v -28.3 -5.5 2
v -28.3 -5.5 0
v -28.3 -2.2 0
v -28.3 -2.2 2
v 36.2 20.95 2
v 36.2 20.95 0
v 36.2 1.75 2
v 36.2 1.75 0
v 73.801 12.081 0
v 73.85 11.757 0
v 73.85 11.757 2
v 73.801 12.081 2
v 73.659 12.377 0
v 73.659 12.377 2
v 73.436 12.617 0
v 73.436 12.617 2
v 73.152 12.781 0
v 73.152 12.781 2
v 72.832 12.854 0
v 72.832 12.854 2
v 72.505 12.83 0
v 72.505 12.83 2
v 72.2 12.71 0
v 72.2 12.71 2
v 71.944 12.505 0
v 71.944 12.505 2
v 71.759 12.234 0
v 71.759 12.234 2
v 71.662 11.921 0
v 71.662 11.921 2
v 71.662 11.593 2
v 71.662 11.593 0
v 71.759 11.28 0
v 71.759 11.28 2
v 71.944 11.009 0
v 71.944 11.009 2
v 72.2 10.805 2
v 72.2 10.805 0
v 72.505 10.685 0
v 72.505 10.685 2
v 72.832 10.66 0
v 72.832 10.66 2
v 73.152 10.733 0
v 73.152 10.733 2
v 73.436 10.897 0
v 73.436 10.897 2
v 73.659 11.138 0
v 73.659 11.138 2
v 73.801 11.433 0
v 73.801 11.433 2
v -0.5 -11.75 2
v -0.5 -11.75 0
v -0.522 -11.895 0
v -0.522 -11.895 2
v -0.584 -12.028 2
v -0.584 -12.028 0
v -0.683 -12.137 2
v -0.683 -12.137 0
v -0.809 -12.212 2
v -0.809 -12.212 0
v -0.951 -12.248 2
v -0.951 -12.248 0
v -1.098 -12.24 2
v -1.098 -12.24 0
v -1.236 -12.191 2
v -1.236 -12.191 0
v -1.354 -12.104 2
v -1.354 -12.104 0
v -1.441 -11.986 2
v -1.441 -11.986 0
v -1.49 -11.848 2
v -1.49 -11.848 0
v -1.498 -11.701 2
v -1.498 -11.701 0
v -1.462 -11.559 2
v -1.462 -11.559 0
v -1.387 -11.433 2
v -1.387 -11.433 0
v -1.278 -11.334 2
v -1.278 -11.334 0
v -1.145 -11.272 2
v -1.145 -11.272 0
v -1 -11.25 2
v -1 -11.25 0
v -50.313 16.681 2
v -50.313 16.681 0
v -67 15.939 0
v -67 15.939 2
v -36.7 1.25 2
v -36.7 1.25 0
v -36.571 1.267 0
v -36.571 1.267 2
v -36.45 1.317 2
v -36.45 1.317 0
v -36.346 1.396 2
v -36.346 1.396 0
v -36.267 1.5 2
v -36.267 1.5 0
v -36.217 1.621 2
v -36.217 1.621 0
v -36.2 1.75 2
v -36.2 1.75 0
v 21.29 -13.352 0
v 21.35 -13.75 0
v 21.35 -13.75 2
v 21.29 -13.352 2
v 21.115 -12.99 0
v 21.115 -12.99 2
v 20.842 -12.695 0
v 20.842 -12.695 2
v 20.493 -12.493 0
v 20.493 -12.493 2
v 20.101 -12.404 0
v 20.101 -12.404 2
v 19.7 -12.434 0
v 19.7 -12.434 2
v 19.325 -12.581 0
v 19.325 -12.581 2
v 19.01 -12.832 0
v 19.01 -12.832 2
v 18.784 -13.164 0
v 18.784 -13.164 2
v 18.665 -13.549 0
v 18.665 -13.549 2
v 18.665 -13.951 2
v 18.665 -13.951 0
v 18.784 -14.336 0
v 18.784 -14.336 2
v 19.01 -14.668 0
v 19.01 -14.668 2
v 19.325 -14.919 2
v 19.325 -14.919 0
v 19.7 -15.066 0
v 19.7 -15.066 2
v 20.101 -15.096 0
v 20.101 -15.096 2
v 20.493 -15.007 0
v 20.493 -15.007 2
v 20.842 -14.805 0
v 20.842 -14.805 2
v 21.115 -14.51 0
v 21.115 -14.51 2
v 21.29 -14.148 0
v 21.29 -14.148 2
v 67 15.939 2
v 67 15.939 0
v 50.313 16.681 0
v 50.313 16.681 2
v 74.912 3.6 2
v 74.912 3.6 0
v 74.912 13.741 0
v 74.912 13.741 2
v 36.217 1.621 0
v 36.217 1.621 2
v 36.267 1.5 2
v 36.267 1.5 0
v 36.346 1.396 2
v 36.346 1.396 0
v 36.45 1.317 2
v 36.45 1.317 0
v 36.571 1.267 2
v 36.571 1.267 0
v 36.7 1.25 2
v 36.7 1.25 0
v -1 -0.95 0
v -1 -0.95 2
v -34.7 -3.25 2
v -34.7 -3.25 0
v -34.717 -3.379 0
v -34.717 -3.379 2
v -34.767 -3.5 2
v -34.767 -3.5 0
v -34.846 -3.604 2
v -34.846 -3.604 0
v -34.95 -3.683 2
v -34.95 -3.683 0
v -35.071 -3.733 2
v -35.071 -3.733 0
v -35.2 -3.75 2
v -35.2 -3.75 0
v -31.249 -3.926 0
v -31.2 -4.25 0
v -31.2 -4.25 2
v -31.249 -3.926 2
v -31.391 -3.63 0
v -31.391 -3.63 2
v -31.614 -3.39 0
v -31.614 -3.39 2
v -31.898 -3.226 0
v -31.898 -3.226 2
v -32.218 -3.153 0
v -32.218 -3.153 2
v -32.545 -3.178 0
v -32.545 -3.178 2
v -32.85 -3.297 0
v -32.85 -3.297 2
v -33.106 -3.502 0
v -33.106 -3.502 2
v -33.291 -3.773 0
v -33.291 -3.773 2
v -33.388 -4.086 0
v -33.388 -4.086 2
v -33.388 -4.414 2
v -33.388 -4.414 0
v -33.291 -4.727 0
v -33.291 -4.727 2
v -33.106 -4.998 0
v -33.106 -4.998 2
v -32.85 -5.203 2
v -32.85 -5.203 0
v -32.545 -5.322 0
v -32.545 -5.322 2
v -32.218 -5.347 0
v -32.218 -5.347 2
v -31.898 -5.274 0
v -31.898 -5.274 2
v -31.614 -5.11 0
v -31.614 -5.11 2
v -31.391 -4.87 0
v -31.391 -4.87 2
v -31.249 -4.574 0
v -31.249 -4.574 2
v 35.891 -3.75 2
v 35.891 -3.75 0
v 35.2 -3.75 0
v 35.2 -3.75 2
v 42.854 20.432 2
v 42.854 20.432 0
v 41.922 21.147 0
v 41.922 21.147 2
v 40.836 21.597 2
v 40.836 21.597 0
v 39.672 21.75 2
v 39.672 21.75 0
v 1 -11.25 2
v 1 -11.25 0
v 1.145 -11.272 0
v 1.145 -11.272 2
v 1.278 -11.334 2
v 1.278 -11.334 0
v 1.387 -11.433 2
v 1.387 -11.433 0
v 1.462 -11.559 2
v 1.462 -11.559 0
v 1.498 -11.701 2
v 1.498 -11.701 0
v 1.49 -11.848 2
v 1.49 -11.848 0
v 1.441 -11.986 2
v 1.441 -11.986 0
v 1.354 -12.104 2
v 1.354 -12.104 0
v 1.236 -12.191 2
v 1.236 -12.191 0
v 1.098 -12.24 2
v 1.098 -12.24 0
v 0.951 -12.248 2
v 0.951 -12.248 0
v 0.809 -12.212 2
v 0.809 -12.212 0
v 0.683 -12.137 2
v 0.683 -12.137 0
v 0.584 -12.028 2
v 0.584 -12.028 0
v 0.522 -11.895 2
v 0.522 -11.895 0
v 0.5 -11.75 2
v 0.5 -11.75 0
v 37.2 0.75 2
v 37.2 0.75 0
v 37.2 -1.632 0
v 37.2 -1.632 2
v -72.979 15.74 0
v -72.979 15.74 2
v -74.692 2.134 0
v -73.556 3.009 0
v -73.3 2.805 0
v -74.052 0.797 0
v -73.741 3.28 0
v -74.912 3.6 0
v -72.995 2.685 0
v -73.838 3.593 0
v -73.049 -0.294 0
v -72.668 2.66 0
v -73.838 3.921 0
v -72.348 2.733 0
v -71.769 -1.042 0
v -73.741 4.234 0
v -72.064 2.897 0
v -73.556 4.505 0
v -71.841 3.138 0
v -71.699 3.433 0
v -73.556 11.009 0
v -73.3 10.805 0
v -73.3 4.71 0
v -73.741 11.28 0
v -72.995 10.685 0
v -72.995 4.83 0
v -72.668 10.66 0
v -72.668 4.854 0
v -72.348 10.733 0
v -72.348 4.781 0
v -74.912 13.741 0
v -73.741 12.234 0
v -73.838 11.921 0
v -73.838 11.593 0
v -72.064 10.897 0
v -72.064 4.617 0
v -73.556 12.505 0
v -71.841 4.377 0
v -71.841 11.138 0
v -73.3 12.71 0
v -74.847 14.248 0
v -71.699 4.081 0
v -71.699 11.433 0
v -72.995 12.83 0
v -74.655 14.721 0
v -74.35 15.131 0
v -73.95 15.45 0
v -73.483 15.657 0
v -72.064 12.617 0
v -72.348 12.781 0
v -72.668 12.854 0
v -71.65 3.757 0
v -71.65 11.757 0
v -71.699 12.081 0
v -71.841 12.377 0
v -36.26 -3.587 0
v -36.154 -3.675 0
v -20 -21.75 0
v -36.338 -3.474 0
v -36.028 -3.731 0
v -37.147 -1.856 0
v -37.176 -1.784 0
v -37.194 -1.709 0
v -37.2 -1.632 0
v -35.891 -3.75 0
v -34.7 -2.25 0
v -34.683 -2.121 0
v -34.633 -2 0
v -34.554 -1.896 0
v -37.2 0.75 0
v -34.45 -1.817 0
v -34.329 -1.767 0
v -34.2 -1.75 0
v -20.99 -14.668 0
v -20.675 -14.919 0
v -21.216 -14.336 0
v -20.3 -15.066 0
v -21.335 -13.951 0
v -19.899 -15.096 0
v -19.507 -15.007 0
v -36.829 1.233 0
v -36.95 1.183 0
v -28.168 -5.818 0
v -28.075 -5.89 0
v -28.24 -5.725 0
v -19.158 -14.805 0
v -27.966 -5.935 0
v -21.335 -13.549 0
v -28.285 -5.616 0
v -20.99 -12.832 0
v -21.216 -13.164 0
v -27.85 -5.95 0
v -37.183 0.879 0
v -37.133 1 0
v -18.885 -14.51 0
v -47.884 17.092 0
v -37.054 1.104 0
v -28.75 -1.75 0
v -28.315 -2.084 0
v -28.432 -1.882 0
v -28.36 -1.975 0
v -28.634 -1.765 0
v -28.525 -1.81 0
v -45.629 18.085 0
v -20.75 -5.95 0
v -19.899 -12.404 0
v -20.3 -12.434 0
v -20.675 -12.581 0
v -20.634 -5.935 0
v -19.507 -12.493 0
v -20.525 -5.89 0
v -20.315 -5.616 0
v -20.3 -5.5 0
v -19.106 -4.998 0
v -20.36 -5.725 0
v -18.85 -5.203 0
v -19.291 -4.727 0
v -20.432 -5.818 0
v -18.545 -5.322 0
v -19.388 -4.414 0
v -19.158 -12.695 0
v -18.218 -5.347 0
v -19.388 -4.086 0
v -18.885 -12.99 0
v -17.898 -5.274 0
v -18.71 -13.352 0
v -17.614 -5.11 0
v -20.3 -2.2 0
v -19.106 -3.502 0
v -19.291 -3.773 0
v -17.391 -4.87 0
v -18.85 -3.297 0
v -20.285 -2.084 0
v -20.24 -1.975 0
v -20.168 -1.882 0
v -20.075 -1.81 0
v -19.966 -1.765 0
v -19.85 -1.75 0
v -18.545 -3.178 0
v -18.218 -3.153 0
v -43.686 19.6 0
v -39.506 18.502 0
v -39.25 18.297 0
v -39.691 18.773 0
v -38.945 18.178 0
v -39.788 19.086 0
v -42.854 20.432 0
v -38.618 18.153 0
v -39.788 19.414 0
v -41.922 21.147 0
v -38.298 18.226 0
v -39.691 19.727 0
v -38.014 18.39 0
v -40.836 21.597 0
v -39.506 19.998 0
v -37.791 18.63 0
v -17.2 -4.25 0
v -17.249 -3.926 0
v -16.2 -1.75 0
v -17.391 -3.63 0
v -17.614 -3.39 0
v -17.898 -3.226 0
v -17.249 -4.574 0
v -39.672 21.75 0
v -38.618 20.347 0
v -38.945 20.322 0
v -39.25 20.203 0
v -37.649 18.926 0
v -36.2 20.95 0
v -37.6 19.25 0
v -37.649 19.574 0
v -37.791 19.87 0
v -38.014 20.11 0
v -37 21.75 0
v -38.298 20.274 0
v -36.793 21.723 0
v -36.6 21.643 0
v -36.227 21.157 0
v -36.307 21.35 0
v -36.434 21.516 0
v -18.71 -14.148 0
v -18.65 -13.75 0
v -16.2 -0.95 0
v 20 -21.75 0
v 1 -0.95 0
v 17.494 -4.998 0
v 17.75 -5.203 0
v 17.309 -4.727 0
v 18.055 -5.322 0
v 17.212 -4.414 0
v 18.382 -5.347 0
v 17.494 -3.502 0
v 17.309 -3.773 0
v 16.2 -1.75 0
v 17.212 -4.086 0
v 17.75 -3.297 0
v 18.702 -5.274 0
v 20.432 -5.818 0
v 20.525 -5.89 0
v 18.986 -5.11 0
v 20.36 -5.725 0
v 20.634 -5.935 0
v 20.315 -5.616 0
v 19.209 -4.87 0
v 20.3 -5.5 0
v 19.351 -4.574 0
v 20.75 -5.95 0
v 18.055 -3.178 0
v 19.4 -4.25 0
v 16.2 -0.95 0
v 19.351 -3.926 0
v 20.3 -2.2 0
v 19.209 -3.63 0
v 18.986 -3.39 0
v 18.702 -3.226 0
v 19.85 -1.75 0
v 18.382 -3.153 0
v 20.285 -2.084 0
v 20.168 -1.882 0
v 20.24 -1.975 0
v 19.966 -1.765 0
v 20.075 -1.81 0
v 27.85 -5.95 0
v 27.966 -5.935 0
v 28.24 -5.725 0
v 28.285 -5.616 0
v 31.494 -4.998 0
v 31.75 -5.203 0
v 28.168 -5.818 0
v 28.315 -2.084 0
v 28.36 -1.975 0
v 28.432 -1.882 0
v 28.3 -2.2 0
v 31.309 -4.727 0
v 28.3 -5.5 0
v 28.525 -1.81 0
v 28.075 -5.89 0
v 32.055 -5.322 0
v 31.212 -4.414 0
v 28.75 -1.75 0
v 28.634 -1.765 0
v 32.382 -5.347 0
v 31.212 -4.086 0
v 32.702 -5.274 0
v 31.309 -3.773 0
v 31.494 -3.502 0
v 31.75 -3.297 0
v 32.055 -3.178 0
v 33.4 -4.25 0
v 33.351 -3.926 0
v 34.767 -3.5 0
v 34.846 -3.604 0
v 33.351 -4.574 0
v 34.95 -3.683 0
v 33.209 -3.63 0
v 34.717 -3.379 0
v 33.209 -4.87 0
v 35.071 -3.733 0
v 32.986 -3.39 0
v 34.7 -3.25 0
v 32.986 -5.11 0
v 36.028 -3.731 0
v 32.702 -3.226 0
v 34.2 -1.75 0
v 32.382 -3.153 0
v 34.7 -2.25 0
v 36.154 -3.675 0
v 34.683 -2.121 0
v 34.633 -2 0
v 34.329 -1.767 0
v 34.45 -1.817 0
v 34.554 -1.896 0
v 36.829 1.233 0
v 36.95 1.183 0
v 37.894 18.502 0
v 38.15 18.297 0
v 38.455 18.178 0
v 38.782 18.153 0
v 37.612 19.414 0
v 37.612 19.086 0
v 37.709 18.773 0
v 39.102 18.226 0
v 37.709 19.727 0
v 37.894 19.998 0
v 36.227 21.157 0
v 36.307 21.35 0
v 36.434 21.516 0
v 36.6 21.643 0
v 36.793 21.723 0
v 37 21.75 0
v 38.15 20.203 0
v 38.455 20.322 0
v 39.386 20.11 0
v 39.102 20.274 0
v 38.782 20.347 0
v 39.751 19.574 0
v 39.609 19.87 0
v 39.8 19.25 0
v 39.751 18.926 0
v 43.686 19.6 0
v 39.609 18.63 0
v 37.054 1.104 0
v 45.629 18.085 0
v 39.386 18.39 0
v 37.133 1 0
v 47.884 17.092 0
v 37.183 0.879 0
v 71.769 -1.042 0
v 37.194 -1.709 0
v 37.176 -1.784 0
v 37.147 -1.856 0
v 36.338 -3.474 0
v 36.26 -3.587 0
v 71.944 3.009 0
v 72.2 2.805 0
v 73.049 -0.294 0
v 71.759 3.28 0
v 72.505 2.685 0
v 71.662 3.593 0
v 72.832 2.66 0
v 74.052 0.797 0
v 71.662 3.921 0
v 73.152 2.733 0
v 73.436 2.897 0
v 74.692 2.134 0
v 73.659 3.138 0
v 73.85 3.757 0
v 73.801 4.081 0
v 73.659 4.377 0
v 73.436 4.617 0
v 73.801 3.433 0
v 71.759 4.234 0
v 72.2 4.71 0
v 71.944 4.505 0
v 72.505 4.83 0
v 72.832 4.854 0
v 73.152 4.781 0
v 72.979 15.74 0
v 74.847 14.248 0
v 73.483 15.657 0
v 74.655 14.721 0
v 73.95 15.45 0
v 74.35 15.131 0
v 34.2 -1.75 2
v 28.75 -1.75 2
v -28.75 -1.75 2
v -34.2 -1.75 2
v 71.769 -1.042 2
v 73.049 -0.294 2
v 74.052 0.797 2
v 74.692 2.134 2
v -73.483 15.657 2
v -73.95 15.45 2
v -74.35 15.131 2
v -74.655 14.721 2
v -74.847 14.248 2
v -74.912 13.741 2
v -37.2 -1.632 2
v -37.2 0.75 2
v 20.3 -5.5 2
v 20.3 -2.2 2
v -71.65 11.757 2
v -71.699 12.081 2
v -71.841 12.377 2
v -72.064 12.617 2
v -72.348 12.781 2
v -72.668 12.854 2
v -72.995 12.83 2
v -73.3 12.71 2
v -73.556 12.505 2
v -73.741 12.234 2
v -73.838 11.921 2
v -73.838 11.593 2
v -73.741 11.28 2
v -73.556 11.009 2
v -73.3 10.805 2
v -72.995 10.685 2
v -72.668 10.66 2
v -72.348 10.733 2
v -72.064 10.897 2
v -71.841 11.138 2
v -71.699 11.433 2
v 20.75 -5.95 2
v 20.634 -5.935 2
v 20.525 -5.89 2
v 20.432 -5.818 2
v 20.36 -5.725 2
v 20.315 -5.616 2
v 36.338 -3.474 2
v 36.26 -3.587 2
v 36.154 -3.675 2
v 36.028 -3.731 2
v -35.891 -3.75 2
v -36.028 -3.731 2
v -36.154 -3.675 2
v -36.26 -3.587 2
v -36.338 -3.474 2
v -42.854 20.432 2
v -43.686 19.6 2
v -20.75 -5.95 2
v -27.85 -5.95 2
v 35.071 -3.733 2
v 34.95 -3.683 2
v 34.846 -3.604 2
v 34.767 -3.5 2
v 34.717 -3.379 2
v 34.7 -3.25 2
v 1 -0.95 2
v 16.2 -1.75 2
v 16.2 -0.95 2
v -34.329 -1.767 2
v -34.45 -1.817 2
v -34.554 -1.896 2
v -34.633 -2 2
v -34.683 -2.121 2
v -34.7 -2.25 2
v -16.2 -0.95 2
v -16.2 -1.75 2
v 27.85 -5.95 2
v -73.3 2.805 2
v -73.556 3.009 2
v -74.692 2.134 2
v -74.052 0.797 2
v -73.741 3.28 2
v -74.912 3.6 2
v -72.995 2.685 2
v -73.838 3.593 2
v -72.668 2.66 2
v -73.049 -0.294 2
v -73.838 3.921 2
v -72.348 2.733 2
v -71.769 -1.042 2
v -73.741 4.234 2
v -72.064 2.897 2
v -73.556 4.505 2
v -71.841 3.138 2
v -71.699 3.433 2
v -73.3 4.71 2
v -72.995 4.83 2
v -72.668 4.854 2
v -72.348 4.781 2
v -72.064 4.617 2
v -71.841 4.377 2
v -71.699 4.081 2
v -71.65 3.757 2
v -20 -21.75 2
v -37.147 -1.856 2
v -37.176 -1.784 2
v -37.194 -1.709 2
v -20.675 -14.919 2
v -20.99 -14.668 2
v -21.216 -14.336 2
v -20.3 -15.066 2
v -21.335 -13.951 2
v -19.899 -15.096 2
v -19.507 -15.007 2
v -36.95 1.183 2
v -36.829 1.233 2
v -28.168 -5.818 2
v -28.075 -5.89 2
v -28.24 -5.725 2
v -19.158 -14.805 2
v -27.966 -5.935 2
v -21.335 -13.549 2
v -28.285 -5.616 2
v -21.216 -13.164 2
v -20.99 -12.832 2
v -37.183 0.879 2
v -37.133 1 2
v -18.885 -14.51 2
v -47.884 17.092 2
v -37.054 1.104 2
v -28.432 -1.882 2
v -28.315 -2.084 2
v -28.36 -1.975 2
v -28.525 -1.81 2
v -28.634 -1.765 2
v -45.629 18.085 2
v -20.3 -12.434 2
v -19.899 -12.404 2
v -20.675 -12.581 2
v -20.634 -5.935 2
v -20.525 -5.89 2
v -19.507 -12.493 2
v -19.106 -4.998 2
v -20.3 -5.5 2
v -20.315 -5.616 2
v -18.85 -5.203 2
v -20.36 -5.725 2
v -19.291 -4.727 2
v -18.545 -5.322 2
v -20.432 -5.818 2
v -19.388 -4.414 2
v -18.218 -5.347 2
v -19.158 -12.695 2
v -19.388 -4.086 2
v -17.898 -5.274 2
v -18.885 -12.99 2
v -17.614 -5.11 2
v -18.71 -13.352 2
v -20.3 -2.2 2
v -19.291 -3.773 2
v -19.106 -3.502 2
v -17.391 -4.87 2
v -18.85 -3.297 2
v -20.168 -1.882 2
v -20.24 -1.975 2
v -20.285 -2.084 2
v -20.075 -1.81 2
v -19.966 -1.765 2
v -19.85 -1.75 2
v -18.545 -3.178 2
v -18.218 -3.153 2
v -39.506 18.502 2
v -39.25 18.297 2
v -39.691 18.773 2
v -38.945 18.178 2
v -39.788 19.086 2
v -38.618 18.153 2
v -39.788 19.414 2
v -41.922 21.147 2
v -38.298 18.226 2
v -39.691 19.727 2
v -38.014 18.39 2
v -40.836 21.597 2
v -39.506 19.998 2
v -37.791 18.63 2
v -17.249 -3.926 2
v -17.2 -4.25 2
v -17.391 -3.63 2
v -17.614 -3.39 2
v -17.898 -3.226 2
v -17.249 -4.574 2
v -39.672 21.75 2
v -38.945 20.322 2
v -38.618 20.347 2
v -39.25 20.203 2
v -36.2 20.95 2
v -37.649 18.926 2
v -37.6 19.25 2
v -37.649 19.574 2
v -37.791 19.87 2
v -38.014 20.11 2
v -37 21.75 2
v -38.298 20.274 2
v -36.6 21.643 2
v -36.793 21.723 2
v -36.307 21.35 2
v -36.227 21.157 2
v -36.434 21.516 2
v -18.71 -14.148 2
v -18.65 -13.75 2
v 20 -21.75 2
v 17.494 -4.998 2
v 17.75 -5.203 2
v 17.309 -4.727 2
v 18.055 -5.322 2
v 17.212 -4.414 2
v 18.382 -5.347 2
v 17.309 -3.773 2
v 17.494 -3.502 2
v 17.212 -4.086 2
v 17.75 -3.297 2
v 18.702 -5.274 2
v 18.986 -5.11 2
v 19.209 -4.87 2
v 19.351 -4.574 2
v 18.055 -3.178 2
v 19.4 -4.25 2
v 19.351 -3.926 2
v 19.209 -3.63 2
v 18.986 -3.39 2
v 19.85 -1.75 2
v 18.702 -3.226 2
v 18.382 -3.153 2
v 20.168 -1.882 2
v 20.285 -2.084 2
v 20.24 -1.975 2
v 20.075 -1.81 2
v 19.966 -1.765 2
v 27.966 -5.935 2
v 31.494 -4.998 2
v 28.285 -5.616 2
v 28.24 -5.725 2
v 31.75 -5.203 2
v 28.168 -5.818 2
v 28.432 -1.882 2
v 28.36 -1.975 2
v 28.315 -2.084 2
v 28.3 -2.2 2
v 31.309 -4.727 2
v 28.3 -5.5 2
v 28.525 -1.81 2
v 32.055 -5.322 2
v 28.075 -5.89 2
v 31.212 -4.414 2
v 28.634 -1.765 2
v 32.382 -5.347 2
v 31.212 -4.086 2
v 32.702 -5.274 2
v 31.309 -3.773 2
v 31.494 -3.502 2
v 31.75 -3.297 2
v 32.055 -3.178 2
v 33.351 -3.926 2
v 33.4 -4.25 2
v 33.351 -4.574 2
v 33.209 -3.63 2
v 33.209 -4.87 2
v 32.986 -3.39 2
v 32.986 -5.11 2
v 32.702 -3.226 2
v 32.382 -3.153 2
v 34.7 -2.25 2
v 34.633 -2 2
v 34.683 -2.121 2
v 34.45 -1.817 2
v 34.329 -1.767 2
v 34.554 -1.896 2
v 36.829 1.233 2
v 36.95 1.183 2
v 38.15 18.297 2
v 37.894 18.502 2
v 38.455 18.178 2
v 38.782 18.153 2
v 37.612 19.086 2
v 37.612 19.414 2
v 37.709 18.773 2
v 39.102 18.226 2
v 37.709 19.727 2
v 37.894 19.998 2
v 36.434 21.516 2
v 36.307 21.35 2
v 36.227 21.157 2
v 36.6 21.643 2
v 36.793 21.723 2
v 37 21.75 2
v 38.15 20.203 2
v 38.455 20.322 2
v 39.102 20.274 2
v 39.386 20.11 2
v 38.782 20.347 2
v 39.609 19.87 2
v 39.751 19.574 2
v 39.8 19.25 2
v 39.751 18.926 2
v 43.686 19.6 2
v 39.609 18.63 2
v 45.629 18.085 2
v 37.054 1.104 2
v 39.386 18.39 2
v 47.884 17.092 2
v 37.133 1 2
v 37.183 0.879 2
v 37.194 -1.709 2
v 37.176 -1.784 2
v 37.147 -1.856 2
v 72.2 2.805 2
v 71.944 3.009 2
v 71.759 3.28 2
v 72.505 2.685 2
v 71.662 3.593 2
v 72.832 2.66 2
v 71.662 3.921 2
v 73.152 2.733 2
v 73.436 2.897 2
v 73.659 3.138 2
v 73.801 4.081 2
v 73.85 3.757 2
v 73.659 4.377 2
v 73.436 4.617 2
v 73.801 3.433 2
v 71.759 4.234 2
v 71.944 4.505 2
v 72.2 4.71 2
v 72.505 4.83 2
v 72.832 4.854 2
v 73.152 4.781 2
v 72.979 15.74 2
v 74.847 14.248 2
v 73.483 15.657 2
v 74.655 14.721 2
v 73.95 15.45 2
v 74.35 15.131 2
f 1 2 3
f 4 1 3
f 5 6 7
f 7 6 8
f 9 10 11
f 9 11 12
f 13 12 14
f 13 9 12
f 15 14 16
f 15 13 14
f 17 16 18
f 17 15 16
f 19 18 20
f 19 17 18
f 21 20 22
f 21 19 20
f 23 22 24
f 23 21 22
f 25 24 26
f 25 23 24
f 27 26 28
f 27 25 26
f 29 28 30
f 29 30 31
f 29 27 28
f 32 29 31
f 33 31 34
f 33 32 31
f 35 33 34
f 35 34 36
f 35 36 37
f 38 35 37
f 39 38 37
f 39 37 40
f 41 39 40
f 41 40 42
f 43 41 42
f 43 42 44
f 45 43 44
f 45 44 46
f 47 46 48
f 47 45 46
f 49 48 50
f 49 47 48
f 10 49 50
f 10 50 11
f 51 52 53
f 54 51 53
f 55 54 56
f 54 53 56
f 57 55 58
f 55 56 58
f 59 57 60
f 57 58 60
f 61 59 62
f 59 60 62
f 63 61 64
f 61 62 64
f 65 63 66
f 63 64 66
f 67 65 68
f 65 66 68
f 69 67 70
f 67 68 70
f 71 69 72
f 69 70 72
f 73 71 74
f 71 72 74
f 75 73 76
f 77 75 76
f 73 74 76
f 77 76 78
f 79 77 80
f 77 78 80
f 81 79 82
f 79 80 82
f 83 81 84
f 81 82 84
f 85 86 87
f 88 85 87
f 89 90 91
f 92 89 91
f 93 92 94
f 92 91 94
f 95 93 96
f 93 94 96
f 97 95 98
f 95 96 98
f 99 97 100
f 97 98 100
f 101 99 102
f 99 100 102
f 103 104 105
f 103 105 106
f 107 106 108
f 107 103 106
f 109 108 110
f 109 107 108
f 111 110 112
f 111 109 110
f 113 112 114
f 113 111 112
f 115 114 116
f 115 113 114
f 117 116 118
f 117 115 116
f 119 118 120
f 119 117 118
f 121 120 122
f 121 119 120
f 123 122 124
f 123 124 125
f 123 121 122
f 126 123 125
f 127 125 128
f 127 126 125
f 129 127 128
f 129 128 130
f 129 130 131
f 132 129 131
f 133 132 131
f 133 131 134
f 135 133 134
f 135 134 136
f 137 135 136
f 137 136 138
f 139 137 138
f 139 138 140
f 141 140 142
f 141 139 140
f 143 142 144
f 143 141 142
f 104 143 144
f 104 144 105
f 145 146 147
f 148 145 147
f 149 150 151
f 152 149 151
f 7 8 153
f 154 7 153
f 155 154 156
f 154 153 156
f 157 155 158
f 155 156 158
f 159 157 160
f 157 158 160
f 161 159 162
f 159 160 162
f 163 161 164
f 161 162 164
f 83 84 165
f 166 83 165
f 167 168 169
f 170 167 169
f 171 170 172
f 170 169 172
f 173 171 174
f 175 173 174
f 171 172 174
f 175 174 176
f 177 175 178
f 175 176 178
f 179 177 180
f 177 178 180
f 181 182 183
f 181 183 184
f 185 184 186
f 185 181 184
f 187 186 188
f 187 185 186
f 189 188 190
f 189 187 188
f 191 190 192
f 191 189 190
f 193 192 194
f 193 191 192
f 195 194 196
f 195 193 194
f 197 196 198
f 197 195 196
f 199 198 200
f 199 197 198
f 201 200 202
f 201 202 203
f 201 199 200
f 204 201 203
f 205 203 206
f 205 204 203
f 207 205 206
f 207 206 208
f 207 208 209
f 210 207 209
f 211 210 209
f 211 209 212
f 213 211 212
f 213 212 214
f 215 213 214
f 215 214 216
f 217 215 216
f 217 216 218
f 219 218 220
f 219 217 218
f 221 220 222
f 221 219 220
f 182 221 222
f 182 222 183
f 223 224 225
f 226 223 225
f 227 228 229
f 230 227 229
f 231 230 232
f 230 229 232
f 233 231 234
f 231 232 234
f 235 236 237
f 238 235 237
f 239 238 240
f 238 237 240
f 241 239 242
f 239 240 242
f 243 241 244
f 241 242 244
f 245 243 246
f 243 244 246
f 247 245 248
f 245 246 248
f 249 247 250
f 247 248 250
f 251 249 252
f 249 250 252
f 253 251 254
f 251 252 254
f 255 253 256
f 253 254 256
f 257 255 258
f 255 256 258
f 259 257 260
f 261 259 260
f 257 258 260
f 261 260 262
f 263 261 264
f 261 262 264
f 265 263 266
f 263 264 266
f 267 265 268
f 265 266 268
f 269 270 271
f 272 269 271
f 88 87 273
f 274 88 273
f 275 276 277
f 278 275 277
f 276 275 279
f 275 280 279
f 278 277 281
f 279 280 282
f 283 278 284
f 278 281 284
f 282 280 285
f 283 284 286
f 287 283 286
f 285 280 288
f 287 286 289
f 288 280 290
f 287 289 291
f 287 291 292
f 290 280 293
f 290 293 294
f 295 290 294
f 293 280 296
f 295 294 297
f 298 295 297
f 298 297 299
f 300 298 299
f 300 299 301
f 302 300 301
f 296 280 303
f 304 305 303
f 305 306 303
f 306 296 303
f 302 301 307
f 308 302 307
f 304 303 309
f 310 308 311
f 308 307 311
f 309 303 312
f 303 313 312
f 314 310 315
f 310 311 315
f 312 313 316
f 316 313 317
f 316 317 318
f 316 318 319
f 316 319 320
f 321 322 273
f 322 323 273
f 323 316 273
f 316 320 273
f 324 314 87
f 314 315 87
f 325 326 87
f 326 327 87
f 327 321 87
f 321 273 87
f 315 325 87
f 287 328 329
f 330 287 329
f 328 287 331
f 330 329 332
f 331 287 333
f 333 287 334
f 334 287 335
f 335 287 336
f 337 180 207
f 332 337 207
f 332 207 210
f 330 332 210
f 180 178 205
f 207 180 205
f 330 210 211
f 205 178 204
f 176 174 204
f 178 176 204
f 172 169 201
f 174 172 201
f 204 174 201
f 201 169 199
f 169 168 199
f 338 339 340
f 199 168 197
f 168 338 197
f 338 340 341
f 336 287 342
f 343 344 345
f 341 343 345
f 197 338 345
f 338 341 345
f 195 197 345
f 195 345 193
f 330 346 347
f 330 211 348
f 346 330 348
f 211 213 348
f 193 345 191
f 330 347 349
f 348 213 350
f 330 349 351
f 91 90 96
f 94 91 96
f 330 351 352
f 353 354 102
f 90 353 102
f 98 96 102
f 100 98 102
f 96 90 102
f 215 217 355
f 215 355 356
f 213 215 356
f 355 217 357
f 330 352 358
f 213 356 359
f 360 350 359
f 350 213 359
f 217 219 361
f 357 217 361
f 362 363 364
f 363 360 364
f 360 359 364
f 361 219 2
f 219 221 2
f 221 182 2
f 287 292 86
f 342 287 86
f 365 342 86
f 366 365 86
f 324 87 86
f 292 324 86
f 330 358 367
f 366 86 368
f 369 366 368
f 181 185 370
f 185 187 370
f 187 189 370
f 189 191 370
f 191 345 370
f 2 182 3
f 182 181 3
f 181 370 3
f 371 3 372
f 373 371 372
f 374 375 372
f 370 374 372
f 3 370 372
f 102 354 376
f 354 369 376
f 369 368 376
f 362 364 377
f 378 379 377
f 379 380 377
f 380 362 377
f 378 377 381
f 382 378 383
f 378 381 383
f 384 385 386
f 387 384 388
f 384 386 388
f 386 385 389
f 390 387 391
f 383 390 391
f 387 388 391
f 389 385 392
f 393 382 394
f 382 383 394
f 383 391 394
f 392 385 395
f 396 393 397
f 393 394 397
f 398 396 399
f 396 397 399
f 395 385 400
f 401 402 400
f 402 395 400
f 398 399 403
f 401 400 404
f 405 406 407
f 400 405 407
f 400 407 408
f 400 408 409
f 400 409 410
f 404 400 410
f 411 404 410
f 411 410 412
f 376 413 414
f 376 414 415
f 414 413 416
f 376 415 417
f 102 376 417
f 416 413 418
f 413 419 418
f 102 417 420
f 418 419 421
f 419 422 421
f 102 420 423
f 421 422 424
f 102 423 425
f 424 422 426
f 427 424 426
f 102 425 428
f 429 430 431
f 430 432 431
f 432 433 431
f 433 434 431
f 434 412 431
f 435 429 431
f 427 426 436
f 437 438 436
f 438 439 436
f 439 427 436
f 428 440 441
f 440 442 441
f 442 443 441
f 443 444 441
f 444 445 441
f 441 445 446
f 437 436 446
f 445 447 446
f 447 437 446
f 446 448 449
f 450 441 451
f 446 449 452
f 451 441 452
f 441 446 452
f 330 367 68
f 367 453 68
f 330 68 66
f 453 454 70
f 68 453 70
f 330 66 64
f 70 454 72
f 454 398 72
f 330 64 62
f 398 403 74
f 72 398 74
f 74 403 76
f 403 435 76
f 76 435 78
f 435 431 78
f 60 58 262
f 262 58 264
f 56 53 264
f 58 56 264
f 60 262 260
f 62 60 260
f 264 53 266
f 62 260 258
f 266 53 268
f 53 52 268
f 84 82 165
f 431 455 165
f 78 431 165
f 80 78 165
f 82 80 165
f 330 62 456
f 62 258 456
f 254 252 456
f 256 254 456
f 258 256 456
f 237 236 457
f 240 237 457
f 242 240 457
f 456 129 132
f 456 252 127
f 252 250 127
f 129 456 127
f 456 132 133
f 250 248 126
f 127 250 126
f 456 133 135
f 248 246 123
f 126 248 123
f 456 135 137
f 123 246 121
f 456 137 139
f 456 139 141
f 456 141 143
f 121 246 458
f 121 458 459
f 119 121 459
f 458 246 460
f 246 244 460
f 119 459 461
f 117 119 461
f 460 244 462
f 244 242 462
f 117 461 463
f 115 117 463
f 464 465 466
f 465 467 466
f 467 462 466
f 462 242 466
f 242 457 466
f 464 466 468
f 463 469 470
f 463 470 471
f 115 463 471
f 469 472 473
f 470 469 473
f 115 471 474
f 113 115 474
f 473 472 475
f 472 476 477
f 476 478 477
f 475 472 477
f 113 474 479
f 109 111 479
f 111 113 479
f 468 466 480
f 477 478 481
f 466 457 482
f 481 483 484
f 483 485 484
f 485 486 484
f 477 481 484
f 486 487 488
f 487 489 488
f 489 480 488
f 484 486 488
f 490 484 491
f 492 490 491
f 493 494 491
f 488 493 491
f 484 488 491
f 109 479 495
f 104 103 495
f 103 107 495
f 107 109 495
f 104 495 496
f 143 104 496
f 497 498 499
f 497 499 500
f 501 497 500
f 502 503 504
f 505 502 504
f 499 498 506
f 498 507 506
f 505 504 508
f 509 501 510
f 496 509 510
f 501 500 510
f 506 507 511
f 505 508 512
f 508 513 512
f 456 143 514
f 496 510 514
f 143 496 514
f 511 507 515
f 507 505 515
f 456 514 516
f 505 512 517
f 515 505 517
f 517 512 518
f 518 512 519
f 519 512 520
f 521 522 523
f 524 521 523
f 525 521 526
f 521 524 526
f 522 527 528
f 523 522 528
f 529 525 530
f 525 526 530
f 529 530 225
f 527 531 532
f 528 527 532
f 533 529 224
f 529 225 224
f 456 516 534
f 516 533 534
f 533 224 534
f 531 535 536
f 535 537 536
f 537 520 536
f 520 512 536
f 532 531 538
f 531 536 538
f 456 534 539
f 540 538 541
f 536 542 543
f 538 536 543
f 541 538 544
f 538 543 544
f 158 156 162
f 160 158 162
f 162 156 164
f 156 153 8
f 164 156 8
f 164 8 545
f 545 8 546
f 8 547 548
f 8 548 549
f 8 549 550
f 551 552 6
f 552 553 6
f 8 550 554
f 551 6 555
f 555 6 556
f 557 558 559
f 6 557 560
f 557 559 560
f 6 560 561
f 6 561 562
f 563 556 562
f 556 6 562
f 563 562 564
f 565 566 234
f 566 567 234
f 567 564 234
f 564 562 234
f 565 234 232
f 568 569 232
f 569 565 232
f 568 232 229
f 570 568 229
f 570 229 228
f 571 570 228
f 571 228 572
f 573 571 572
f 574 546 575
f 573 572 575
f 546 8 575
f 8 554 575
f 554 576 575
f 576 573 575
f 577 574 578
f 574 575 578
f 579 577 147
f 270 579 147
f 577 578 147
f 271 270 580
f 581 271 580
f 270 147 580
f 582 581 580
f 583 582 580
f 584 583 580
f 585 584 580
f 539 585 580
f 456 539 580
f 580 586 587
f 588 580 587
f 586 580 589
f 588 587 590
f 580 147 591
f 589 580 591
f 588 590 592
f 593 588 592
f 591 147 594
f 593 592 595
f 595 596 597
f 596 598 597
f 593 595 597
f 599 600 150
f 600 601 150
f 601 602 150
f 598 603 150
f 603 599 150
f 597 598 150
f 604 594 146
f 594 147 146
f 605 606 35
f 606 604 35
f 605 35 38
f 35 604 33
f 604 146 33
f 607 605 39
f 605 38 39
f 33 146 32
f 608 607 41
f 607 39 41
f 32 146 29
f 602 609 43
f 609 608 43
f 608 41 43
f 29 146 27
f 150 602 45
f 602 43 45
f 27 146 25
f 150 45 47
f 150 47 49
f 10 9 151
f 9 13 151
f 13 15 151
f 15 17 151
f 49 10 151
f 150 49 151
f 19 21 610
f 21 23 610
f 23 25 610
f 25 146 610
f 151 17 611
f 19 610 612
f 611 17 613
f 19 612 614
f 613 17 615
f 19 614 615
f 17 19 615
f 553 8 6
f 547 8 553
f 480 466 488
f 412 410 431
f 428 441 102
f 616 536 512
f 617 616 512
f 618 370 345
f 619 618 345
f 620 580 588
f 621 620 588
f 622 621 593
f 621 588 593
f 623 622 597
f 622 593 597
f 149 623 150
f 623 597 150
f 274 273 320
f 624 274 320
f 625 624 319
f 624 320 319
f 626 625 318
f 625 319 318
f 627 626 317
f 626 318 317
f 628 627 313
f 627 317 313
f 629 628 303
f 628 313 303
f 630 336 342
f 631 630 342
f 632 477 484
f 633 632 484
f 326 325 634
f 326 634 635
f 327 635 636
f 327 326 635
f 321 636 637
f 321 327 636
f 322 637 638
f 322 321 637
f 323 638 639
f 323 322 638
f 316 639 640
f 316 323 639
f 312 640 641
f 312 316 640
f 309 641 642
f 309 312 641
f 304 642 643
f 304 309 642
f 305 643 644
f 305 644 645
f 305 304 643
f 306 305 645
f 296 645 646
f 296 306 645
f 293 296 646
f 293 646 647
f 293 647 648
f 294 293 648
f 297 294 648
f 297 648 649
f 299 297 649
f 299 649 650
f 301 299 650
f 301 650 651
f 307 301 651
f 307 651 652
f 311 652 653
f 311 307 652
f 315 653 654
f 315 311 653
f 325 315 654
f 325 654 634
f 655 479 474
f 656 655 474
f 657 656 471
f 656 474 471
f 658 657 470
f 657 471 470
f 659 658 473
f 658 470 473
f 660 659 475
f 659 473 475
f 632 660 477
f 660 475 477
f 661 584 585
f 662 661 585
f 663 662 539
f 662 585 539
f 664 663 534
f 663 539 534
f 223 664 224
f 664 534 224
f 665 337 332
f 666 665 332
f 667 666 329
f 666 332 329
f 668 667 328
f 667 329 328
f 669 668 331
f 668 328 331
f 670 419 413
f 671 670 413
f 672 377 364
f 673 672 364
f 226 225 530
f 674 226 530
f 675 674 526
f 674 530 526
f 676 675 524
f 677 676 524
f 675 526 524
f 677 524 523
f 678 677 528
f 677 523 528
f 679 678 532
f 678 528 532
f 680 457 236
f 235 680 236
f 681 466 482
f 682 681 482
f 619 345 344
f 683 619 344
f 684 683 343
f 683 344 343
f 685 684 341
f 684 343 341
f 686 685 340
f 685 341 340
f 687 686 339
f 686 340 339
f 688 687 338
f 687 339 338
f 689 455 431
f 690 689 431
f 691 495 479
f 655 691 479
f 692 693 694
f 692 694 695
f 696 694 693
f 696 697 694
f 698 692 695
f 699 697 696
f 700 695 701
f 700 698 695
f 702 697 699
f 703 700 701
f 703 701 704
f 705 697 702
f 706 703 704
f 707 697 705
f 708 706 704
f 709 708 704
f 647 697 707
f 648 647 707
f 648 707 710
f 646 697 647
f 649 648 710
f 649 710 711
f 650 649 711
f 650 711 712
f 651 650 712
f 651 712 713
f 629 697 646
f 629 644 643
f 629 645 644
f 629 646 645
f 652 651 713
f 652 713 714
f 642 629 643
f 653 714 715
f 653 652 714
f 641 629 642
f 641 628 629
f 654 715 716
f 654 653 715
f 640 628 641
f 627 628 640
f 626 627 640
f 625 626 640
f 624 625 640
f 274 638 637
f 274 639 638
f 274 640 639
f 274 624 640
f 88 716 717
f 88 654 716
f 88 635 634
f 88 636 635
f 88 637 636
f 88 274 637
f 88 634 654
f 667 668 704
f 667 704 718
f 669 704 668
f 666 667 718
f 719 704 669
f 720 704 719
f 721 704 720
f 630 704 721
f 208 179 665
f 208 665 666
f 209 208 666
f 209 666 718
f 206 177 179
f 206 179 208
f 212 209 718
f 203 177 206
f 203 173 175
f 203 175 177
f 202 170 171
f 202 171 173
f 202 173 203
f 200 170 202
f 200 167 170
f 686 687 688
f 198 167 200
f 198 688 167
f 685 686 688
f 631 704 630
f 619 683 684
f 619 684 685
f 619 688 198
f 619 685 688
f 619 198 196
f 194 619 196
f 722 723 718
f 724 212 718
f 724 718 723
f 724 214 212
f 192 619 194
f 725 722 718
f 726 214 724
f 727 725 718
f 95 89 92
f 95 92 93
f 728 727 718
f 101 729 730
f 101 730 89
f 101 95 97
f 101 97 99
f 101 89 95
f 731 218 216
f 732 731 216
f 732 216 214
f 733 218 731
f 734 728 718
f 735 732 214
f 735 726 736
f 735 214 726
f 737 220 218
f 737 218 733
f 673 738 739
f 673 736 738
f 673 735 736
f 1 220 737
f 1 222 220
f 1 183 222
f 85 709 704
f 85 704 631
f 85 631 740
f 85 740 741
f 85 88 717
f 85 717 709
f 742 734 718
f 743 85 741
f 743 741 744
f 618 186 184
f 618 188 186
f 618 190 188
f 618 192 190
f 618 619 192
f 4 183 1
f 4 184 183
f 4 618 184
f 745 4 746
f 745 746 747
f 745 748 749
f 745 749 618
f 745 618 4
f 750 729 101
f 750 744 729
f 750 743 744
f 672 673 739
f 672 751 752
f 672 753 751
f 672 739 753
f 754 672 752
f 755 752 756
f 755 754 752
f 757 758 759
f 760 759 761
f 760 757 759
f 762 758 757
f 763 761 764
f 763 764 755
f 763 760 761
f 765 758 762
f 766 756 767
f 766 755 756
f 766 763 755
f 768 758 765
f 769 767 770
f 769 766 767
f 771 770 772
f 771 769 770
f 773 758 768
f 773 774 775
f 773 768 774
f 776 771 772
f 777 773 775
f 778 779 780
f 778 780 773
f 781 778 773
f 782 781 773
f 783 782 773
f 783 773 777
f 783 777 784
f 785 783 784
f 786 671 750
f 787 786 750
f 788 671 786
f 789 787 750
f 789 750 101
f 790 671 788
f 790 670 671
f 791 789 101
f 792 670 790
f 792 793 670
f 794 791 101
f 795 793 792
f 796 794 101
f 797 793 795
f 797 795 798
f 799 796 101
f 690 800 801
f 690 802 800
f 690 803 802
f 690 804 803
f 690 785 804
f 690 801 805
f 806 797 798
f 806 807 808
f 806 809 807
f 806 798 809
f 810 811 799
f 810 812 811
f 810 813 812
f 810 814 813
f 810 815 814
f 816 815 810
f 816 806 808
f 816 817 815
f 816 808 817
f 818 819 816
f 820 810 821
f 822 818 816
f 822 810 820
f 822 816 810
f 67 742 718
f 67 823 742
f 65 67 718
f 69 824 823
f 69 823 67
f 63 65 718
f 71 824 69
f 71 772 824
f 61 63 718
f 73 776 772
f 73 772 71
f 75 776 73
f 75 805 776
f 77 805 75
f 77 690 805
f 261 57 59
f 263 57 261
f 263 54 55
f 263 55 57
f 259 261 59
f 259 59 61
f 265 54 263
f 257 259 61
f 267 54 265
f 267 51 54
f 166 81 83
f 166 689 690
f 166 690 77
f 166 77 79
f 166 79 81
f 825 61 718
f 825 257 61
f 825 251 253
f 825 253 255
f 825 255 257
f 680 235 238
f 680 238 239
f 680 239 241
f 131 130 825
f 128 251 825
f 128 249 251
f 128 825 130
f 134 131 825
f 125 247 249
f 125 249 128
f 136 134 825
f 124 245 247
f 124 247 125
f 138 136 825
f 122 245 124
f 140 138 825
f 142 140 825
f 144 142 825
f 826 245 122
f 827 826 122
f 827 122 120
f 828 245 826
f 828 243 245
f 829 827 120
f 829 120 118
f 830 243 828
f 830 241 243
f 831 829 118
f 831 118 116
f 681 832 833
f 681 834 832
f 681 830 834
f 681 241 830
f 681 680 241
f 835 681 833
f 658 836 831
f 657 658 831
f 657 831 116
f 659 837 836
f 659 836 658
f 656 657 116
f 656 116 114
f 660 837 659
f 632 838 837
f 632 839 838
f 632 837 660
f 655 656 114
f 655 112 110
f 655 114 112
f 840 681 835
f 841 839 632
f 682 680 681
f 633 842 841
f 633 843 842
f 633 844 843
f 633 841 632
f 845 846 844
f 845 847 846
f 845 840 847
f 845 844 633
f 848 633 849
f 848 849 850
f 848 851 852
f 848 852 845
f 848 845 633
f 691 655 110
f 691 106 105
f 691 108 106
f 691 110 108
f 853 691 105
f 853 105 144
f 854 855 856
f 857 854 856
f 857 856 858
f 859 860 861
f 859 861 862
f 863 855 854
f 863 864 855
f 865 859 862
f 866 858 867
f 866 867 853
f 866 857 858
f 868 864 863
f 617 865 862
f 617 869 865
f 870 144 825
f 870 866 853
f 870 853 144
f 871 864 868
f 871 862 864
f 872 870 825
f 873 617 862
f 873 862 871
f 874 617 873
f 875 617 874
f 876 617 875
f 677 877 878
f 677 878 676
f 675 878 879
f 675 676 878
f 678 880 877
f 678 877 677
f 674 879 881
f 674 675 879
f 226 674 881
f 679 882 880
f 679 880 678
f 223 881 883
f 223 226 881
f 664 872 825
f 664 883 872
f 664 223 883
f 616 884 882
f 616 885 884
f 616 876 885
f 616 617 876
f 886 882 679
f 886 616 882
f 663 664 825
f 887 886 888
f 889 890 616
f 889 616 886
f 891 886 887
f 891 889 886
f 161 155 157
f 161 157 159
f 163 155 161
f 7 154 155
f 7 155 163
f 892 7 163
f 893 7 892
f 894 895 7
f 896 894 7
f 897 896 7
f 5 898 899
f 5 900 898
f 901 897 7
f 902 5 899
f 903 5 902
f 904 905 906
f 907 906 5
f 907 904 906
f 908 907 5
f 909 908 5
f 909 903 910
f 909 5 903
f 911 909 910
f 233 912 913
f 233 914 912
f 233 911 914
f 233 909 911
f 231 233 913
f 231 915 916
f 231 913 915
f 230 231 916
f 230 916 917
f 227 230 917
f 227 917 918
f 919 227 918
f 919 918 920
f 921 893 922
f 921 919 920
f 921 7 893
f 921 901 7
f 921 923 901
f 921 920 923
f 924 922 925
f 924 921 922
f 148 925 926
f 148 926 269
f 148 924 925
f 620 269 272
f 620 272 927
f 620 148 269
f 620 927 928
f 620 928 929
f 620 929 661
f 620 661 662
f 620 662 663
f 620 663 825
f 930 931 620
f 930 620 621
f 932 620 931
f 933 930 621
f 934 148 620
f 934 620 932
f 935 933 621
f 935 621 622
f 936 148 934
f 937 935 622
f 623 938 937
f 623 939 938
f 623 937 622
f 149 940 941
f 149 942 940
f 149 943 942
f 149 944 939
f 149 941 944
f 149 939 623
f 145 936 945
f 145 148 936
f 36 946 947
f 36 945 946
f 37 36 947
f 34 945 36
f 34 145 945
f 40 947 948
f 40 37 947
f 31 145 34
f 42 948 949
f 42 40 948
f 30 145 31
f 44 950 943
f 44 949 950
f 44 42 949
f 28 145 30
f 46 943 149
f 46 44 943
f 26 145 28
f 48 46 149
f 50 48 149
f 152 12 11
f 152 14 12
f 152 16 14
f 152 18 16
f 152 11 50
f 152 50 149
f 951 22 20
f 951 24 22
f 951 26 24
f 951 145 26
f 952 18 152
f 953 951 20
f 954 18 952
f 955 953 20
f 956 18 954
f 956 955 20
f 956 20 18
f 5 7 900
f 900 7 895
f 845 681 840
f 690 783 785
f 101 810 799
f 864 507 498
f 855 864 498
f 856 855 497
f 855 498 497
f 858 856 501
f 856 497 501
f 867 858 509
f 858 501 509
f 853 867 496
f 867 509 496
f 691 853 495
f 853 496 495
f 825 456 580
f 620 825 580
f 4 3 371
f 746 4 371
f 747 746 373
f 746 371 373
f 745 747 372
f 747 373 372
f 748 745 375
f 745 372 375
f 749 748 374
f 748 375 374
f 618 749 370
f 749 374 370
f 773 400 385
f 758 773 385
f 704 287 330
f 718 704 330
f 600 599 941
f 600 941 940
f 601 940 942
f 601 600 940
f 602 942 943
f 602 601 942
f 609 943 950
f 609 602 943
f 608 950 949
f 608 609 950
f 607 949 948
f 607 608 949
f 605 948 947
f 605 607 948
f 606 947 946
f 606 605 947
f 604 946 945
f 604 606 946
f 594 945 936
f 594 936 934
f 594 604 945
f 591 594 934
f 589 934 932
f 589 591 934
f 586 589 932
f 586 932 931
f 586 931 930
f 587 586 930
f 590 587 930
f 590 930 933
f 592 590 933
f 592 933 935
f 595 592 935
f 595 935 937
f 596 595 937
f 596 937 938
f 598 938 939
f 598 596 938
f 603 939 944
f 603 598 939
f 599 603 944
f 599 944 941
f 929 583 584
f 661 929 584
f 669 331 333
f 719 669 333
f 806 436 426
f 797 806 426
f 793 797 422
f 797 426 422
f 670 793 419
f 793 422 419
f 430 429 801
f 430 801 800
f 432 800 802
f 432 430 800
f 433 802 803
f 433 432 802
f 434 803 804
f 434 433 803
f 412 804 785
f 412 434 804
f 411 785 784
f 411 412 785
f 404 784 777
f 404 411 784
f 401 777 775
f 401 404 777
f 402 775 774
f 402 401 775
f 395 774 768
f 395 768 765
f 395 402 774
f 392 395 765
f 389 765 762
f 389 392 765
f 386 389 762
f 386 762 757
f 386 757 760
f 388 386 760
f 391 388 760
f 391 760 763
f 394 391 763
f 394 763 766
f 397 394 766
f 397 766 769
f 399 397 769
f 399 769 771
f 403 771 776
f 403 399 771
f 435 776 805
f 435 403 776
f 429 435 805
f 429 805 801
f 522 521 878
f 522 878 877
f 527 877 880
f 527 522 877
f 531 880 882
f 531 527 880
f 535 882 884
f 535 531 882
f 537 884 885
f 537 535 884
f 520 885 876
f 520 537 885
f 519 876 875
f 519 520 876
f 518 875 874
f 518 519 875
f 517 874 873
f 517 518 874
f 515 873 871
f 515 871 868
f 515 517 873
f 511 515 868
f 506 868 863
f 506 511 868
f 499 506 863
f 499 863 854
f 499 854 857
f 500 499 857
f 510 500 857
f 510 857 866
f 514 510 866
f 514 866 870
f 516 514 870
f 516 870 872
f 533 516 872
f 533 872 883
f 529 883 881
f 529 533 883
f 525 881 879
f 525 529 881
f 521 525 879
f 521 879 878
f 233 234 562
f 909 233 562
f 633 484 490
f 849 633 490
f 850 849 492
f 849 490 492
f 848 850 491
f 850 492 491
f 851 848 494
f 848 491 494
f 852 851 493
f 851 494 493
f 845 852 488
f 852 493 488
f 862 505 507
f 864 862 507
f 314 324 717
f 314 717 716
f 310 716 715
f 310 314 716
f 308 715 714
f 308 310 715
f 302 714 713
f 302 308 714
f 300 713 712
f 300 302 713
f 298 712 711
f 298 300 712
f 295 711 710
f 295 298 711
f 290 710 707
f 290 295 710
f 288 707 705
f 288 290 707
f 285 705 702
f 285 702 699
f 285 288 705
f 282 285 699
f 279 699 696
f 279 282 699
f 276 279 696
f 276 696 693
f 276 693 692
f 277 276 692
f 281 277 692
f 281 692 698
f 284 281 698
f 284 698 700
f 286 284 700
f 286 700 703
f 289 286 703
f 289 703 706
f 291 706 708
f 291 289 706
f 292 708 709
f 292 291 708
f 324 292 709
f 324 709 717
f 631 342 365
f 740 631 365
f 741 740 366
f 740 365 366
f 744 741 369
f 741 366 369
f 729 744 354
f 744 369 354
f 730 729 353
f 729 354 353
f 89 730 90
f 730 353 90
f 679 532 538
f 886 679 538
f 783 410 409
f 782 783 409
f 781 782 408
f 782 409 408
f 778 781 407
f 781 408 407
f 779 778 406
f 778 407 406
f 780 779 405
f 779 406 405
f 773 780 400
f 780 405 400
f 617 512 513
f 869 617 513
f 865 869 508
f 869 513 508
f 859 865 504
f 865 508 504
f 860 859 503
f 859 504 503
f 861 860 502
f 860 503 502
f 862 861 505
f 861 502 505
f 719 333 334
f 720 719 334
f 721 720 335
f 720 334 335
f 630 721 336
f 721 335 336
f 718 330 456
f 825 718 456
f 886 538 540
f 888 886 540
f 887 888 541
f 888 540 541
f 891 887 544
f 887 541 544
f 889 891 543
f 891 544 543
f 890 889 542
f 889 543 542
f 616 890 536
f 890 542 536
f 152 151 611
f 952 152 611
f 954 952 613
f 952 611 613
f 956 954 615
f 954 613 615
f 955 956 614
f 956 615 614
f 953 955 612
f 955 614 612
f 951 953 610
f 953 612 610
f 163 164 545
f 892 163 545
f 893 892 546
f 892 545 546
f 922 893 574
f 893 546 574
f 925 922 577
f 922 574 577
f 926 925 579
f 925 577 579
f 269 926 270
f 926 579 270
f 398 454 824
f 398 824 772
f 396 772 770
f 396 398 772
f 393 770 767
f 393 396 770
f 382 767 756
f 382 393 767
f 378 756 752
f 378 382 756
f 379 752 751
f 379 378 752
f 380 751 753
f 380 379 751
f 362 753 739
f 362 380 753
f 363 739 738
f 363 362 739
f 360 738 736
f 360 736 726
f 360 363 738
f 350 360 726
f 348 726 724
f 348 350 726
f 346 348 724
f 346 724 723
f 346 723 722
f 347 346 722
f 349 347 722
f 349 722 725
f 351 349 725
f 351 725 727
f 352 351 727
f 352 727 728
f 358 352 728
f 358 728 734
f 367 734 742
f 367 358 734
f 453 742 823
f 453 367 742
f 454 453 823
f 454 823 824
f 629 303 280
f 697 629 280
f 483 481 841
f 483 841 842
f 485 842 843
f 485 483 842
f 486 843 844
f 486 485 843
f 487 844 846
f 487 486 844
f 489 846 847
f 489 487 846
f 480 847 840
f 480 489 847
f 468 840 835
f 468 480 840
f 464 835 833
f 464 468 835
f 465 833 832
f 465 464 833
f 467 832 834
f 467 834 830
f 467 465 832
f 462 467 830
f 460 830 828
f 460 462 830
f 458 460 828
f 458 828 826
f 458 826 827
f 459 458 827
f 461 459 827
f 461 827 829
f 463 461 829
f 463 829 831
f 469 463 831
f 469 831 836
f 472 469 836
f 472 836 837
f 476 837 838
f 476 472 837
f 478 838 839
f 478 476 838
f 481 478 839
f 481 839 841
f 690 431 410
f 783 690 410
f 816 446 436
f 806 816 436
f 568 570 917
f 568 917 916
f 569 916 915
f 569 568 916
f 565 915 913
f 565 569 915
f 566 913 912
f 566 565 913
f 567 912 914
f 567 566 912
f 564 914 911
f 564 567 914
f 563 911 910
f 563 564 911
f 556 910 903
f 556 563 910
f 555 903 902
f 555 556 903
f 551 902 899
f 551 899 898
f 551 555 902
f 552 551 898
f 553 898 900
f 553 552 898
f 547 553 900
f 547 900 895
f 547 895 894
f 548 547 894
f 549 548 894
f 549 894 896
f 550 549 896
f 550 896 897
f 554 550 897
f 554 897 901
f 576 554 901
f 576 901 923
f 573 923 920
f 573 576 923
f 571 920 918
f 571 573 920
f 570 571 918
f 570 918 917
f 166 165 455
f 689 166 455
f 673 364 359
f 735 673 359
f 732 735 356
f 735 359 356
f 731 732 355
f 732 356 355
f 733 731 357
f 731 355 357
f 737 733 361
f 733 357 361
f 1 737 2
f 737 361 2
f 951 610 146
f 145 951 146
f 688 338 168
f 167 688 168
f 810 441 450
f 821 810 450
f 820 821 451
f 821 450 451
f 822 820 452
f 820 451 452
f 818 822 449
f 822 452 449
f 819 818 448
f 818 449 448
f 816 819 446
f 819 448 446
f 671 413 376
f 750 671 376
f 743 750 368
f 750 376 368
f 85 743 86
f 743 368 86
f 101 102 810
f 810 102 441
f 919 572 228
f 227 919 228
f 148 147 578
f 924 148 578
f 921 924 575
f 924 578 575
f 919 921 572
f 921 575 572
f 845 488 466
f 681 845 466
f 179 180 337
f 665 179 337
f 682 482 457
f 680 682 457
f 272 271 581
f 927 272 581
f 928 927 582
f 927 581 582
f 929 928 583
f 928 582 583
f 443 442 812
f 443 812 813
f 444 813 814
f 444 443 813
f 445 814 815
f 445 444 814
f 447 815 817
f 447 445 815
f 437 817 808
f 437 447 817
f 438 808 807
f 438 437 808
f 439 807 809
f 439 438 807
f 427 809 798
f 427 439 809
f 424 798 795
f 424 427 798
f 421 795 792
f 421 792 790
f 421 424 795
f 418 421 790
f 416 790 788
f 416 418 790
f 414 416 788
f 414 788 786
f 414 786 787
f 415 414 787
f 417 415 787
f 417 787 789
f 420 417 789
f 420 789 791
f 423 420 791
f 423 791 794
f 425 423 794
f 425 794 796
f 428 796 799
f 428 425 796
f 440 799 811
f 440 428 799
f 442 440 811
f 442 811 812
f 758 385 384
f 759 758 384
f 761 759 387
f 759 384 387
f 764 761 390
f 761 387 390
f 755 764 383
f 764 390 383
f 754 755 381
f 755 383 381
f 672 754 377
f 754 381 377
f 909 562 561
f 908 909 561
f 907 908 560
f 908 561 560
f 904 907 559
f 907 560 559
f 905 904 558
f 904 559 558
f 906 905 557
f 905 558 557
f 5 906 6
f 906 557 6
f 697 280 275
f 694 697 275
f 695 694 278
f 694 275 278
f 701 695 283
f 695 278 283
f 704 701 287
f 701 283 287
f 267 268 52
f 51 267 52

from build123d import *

# Parameters (mm, degrees)
SKETCH_1_R      = 1.1
SKETCH_1_R_2    = 1.35
EXTRUDE_1_DEPTH = 2


with BuildPart() as part:
    # 草图1 → 凸台-拉伸1 (new body)
    with BuildSketch(Plane.XY):
        with BuildLine():
            Line((36.2, 20.95), (36.2, 1.75))
            ThreePointArc((36.2, 1.75), (36.346446609, 1.396446609), (36.7, 1.25))
            ThreePointArc((36.7, 1.25), (37.053553391, 1.103553391), (37.2, 0.75))
            Line((37.2, 0.75), (37.2, -1.631966011))
            ThreePointArc((37.2, -1.631966011), (37.186624495, -1.746842472), (37.147213595, -1.855572809))
            Line((37.147213595, -1.855572809), (36.338196601, -3.473606798))
            ThreePointArc((36.338196601, -3.473606798), (36.153848562, -3.675325404), (35.890983006, -3.75))
            Line((35.890983006, -3.75), (35.2, -3.75))
            ThreePointArc((35.2, -3.75), (34.846446609, -3.603553391), (34.7, -3.25))
            Line((34.7, -3.25), (34.7, -2.25))
            ThreePointArc((34.7, -2.25), (34.553553391, -1.896446609), (34.2, -1.75))
            Line((34.2, -1.75), (28.75, -1.75))
            ThreePointArc((28.75, -1.75), (28.431801948, -1.881801948), (28.3, -2.2))
            Line((28.3, -2.2), (28.3, -5.5))
            ThreePointArc((28.3, -5.5), (28.168198052, -5.818198052), (27.85, -5.95))
            Line((27.85, -5.95), (20.75, -5.95))
            ThreePointArc((20.75, -5.95), (20.431801948, -5.818198052), (20.3, -5.5))
            Line((20.3, -5.5), (20.3, -2.2))
            ThreePointArc((20.3, -2.2), (20.168198052, -1.881801948), (19.85, -1.75))
            Line((19.85, -1.75), (16.2, -1.75))
            Line((16.2, -1.75), (16.2, -0.95))
            Line((16.2, -0.95), (1, -0.95))
            Line((1, -0.95), (1, -11.25))
            ThreePointArc((1, -11.25), (1.353553391, -12.103553391), (0.5, -11.75))
            Line((0.5, -11.75), (-0.5, -11.75))
            ThreePointArc((-0.5, -11.75), (-1.353553391, -12.103553391), (-1, -11.25))
            Line((-1, -11.25), (-1, -0.95))
            Line((-1, -0.95), (-16.2, -0.95))
            Line((-16.2, -0.95), (-16.2, -1.75))
            Line((-16.2, -1.75), (-19.85, -1.75))
            ThreePointArc((-19.85, -1.75), (-20.168198052, -1.881801948), (-20.3, -2.2))
            Line((-20.3, -2.2), (-20.3, -5.5))
            ThreePointArc((-20.3, -5.5), (-20.431801948, -5.818198052), (-20.75, -5.95))
            Line((-20.75, -5.95), (-27.85, -5.95))
            ThreePointArc((-27.85, -5.95), (-28.168198052, -5.818198052), (-28.3, -5.5))
            Line((-28.3, -5.5), (-28.3, -2.2))
            ThreePointArc((-28.3, -2.2), (-28.431801948, -1.881801948), (-28.75, -1.75))
            Line((-28.75, -1.75), (-34.2, -1.75))
            ThreePointArc((-34.2, -1.75), (-34.553553391, -1.896446609), (-34.7, -2.25))
            Line((-34.7, -2.25), (-34.7, -3.25))
            ThreePointArc((-34.7, -3.25), (-34.846446609, -3.603553391), (-35.2, -3.75))
            Line((-35.2, -3.75), (-35.890983006, -3.75))
            ThreePointArc((-35.890983006, -3.75), (-36.153848562, -3.675325404), (-36.338196601, -3.473606798))
            Line((-36.338196601, -3.473606798), (-37.147213595, -1.855572809))
            ThreePointArc((-37.147213595, -1.855572809), (-37.186624495, -1.746842472), (-37.2, -1.631966011))
            Line((-37.2, -1.631966011), (-37.2, 0.75))
            ThreePointArc((-37.2, 0.75), (-37.053553391, 1.103553391), (-36.7, 1.25))
            ThreePointArc((-36.7, 1.25), (-36.346446609, 1.396446609), (-36.2, 1.75))
            Line((-36.2, 1.75), (-36.2, 20.95))
            ThreePointArc((-36.2, 20.95), (-36.434314575, 21.515685425), (-37, 21.75))
            Line((-37, 21.75), (-39.671594525, 21.75))
            ThreePointArc((-39.671594525, 21.75), (-41.393669971, 21.407457896), (-42.85357504, 20.431980515))
            Line((-42.85357504, 20.431980515), (-43.685952604, 19.599602951))
            ThreePointArc((-43.685952604, 19.599602951), (-46.725975031, 17.519131379), (-50.31301428, 16.680532699))
            Line((-50.31301428, 16.680532699), (-67, 15.938888889))
            Line((-67, 15.938888889), (-72.978782406, 15.739596142))
            ThreePointArc((-72.978782406, 15.739596142), (-74.349730451, 15.13116321), (-74.912152745, 13.740706328))
            Line((-74.912152745, 13.740706328), (-74.912152745, 3.600025905))
            ThreePointArc((-74.912152745, 3.600025905), (-74.052488898, 0.796881859), (-71.769106127, -1.042357549))
            Line((-71.769106127, -1.042357549), (-20, -21.75))
            Line((-20, -21.75), (20, -21.75))
            Line((20, -21.75), (71.769106127, -1.042357549))
            ThreePointArc((71.769106127, -1.042357549), (74.052488898, 0.796881859), (74.912152745, 3.600025905))
            Line((74.912152745, 3.600025905), (74.912152745, 13.740706328))
            ThreePointArc((74.912152745, 13.740706328), (74.349730451, 15.13116321), (72.978782406, 15.739596142))
            Line((72.978782406, 15.739596142), (67, 15.938888889))
            Line((67, 15.938888889), (50.31301428, 16.680532699))
            ThreePointArc((50.31301428, 16.680532699), (46.725975031, 17.519131379), (43.685952604, 19.599602951))
            Line((43.685952604, 19.599602951), (42.85357504, 20.431980515))
            ThreePointArc((42.85357504, 20.431980515), (41.393669971, 21.407457896), (39.671594525, 21.75))
            Line((39.671594525, 21.75), (37, 21.75))
            ThreePointArc((37, 21.75), (36.434314575, 21.515685425), (36.2, 20.95))
        make_face()
        with Locations((72.75, 3.75716439)):
            Circle(SKETCH_1_R, mode=Mode.SUBTRACT)
        with Locations((72.75, 11.75716439)):
            Circle(SKETCH_1_R, mode=Mode.SUBTRACT)
        with Locations((38.7, 19.25)):
            Circle(SKETCH_1_R, mode=Mode.SUBTRACT)
        with Locations((32.3, -4.25)):
            Circle(SKETCH_1_R, mode=Mode.SUBTRACT)
        with Locations((18.3, -4.25)):
            Circle(SKETCH_1_R, mode=Mode.SUBTRACT)
        with Locations((20, -13.75)):
            Circle(SKETCH_1_R_2, mode=Mode.SUBTRACT)
        with Locations((-18.3, -4.25)):
            Circle(SKETCH_1_R, mode=Mode.SUBTRACT)
        with Locations((-32.3, -4.25)):
            Circle(SKETCH_1_R, mode=Mode.SUBTRACT)
        with Locations((-20, -13.75)):
            Circle(SKETCH_1_R_2, mode=Mode.SUBTRACT)
        with Locations((-38.7, 19.25)):
            Circle(SKETCH_1_R, mode=Mode.SUBTRACT)
        with Locations((-72.75, 3.75716439)):
            Circle(SKETCH_1_R, mode=Mode.SUBTRACT)
        with Locations((-72.75, 11.75716439)):
            Circle(SKETCH_1_R, mode=Mode.SUBTRACT)
    extrude(amount=EXTRUDE_1_DEPTH)


solid = part.part
